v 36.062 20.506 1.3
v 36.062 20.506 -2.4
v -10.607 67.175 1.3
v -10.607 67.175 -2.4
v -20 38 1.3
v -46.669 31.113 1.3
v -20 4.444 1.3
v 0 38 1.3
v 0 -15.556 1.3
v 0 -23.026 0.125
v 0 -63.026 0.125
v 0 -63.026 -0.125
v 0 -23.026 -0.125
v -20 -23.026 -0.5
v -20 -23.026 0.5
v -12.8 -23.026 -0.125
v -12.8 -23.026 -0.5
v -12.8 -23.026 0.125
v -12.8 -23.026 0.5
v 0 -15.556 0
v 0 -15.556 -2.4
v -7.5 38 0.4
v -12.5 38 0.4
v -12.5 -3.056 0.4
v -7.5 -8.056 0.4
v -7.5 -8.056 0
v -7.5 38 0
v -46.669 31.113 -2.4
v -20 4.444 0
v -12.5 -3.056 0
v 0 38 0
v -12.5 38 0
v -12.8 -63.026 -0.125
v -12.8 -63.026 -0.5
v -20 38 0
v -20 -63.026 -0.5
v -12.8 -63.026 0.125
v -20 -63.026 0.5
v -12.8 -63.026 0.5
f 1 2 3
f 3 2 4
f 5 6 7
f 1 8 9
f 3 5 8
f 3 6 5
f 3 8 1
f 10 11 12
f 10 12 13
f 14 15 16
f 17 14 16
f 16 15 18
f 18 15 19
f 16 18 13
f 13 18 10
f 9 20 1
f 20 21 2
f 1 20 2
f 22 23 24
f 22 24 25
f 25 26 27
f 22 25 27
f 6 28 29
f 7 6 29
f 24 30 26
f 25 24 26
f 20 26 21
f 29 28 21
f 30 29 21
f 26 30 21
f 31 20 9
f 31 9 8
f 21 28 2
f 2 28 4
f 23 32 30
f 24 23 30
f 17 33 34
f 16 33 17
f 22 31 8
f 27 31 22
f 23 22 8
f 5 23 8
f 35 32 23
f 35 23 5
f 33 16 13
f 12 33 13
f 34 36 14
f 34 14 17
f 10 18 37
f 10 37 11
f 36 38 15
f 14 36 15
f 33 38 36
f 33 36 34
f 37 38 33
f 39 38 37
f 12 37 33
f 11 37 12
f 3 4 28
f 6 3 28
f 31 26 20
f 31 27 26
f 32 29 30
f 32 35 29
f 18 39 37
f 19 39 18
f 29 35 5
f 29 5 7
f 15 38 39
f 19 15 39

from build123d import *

# Parameters (mm, degrees)
F1_W          = 7.2
F1_H          = 40
F3_DEPTH      = 0.5
F3_DEPTH_BACK = 0.5
F2_W          = 12.8
F2_H          = 40
F4_DEPTH      = 0.125
F4_DEPTH_BACK = 0.125
F6_DEPTH      = 2.4
F6_DEPTH_BACK = 1.3
F8_DEPTH      = 1.3
F10_DEPTH     = 0.4


with BuildPart() as f3:
    # F1 (on Top) → F3 (new body, two sides)
    with BuildSketch(Plane.XY) as f3_sk:
        with Locations((-16.4, -43.0259331628)):
            Rectangle(F1_W, F1_H)
    extrude(amount=F3_DEPTH)
    extrude(f3_sk.sketch, amount=-F3_DEPTH_BACK)

    # F2 (on Top) → F4 (join, two sides)
    with BuildSketch(Plane.XY) as f4_sk:
        with Locations((-6.4, -43.0259331628)):
            Rectangle(F2_W, F2_H)
    extrude(amount=F4_DEPTH)
    extrude(f4_sk.sketch, amount=-F4_DEPTH_BACK)


with BuildPart() as f6:
    # F5 (on Top) → F6 (new body, two sides)
    with BuildSketch(Plane.XY) as f6_sk:
        Polygon((-10.6066017178, 67.1751442127), (-46.6690475583, 31.1126983722), (0, -15.5563491861), (36.0624458405, 20.5060966544), align=None)
    extrude(amount=-F6_DEPTH)
    extrude(f6_sk.sketch, amount=F6_DEPTH_BACK)

    # F7 (on Top) → F8 (cut)
    with BuildSketch(Plane.XY):
        Polygon((0, -15.5563491861), (0, 38), (-20, 38), (-20, 4.4436508139), align=None)
    extrude(amount=F8_DEPTH, mode=Mode.SUBTRACT)

    # F9 (on Top) → F10 (join)
    with BuildSketch(Plane.XY):
        Polygon((-7.5, 38), (-12.5, 38), (-12.5, -3.0563491861), (-7.5, -8.0563491861), align=None)
    extrude(amount=F10_DEPTH)


solid = Compound([f3.part, f6.part])
